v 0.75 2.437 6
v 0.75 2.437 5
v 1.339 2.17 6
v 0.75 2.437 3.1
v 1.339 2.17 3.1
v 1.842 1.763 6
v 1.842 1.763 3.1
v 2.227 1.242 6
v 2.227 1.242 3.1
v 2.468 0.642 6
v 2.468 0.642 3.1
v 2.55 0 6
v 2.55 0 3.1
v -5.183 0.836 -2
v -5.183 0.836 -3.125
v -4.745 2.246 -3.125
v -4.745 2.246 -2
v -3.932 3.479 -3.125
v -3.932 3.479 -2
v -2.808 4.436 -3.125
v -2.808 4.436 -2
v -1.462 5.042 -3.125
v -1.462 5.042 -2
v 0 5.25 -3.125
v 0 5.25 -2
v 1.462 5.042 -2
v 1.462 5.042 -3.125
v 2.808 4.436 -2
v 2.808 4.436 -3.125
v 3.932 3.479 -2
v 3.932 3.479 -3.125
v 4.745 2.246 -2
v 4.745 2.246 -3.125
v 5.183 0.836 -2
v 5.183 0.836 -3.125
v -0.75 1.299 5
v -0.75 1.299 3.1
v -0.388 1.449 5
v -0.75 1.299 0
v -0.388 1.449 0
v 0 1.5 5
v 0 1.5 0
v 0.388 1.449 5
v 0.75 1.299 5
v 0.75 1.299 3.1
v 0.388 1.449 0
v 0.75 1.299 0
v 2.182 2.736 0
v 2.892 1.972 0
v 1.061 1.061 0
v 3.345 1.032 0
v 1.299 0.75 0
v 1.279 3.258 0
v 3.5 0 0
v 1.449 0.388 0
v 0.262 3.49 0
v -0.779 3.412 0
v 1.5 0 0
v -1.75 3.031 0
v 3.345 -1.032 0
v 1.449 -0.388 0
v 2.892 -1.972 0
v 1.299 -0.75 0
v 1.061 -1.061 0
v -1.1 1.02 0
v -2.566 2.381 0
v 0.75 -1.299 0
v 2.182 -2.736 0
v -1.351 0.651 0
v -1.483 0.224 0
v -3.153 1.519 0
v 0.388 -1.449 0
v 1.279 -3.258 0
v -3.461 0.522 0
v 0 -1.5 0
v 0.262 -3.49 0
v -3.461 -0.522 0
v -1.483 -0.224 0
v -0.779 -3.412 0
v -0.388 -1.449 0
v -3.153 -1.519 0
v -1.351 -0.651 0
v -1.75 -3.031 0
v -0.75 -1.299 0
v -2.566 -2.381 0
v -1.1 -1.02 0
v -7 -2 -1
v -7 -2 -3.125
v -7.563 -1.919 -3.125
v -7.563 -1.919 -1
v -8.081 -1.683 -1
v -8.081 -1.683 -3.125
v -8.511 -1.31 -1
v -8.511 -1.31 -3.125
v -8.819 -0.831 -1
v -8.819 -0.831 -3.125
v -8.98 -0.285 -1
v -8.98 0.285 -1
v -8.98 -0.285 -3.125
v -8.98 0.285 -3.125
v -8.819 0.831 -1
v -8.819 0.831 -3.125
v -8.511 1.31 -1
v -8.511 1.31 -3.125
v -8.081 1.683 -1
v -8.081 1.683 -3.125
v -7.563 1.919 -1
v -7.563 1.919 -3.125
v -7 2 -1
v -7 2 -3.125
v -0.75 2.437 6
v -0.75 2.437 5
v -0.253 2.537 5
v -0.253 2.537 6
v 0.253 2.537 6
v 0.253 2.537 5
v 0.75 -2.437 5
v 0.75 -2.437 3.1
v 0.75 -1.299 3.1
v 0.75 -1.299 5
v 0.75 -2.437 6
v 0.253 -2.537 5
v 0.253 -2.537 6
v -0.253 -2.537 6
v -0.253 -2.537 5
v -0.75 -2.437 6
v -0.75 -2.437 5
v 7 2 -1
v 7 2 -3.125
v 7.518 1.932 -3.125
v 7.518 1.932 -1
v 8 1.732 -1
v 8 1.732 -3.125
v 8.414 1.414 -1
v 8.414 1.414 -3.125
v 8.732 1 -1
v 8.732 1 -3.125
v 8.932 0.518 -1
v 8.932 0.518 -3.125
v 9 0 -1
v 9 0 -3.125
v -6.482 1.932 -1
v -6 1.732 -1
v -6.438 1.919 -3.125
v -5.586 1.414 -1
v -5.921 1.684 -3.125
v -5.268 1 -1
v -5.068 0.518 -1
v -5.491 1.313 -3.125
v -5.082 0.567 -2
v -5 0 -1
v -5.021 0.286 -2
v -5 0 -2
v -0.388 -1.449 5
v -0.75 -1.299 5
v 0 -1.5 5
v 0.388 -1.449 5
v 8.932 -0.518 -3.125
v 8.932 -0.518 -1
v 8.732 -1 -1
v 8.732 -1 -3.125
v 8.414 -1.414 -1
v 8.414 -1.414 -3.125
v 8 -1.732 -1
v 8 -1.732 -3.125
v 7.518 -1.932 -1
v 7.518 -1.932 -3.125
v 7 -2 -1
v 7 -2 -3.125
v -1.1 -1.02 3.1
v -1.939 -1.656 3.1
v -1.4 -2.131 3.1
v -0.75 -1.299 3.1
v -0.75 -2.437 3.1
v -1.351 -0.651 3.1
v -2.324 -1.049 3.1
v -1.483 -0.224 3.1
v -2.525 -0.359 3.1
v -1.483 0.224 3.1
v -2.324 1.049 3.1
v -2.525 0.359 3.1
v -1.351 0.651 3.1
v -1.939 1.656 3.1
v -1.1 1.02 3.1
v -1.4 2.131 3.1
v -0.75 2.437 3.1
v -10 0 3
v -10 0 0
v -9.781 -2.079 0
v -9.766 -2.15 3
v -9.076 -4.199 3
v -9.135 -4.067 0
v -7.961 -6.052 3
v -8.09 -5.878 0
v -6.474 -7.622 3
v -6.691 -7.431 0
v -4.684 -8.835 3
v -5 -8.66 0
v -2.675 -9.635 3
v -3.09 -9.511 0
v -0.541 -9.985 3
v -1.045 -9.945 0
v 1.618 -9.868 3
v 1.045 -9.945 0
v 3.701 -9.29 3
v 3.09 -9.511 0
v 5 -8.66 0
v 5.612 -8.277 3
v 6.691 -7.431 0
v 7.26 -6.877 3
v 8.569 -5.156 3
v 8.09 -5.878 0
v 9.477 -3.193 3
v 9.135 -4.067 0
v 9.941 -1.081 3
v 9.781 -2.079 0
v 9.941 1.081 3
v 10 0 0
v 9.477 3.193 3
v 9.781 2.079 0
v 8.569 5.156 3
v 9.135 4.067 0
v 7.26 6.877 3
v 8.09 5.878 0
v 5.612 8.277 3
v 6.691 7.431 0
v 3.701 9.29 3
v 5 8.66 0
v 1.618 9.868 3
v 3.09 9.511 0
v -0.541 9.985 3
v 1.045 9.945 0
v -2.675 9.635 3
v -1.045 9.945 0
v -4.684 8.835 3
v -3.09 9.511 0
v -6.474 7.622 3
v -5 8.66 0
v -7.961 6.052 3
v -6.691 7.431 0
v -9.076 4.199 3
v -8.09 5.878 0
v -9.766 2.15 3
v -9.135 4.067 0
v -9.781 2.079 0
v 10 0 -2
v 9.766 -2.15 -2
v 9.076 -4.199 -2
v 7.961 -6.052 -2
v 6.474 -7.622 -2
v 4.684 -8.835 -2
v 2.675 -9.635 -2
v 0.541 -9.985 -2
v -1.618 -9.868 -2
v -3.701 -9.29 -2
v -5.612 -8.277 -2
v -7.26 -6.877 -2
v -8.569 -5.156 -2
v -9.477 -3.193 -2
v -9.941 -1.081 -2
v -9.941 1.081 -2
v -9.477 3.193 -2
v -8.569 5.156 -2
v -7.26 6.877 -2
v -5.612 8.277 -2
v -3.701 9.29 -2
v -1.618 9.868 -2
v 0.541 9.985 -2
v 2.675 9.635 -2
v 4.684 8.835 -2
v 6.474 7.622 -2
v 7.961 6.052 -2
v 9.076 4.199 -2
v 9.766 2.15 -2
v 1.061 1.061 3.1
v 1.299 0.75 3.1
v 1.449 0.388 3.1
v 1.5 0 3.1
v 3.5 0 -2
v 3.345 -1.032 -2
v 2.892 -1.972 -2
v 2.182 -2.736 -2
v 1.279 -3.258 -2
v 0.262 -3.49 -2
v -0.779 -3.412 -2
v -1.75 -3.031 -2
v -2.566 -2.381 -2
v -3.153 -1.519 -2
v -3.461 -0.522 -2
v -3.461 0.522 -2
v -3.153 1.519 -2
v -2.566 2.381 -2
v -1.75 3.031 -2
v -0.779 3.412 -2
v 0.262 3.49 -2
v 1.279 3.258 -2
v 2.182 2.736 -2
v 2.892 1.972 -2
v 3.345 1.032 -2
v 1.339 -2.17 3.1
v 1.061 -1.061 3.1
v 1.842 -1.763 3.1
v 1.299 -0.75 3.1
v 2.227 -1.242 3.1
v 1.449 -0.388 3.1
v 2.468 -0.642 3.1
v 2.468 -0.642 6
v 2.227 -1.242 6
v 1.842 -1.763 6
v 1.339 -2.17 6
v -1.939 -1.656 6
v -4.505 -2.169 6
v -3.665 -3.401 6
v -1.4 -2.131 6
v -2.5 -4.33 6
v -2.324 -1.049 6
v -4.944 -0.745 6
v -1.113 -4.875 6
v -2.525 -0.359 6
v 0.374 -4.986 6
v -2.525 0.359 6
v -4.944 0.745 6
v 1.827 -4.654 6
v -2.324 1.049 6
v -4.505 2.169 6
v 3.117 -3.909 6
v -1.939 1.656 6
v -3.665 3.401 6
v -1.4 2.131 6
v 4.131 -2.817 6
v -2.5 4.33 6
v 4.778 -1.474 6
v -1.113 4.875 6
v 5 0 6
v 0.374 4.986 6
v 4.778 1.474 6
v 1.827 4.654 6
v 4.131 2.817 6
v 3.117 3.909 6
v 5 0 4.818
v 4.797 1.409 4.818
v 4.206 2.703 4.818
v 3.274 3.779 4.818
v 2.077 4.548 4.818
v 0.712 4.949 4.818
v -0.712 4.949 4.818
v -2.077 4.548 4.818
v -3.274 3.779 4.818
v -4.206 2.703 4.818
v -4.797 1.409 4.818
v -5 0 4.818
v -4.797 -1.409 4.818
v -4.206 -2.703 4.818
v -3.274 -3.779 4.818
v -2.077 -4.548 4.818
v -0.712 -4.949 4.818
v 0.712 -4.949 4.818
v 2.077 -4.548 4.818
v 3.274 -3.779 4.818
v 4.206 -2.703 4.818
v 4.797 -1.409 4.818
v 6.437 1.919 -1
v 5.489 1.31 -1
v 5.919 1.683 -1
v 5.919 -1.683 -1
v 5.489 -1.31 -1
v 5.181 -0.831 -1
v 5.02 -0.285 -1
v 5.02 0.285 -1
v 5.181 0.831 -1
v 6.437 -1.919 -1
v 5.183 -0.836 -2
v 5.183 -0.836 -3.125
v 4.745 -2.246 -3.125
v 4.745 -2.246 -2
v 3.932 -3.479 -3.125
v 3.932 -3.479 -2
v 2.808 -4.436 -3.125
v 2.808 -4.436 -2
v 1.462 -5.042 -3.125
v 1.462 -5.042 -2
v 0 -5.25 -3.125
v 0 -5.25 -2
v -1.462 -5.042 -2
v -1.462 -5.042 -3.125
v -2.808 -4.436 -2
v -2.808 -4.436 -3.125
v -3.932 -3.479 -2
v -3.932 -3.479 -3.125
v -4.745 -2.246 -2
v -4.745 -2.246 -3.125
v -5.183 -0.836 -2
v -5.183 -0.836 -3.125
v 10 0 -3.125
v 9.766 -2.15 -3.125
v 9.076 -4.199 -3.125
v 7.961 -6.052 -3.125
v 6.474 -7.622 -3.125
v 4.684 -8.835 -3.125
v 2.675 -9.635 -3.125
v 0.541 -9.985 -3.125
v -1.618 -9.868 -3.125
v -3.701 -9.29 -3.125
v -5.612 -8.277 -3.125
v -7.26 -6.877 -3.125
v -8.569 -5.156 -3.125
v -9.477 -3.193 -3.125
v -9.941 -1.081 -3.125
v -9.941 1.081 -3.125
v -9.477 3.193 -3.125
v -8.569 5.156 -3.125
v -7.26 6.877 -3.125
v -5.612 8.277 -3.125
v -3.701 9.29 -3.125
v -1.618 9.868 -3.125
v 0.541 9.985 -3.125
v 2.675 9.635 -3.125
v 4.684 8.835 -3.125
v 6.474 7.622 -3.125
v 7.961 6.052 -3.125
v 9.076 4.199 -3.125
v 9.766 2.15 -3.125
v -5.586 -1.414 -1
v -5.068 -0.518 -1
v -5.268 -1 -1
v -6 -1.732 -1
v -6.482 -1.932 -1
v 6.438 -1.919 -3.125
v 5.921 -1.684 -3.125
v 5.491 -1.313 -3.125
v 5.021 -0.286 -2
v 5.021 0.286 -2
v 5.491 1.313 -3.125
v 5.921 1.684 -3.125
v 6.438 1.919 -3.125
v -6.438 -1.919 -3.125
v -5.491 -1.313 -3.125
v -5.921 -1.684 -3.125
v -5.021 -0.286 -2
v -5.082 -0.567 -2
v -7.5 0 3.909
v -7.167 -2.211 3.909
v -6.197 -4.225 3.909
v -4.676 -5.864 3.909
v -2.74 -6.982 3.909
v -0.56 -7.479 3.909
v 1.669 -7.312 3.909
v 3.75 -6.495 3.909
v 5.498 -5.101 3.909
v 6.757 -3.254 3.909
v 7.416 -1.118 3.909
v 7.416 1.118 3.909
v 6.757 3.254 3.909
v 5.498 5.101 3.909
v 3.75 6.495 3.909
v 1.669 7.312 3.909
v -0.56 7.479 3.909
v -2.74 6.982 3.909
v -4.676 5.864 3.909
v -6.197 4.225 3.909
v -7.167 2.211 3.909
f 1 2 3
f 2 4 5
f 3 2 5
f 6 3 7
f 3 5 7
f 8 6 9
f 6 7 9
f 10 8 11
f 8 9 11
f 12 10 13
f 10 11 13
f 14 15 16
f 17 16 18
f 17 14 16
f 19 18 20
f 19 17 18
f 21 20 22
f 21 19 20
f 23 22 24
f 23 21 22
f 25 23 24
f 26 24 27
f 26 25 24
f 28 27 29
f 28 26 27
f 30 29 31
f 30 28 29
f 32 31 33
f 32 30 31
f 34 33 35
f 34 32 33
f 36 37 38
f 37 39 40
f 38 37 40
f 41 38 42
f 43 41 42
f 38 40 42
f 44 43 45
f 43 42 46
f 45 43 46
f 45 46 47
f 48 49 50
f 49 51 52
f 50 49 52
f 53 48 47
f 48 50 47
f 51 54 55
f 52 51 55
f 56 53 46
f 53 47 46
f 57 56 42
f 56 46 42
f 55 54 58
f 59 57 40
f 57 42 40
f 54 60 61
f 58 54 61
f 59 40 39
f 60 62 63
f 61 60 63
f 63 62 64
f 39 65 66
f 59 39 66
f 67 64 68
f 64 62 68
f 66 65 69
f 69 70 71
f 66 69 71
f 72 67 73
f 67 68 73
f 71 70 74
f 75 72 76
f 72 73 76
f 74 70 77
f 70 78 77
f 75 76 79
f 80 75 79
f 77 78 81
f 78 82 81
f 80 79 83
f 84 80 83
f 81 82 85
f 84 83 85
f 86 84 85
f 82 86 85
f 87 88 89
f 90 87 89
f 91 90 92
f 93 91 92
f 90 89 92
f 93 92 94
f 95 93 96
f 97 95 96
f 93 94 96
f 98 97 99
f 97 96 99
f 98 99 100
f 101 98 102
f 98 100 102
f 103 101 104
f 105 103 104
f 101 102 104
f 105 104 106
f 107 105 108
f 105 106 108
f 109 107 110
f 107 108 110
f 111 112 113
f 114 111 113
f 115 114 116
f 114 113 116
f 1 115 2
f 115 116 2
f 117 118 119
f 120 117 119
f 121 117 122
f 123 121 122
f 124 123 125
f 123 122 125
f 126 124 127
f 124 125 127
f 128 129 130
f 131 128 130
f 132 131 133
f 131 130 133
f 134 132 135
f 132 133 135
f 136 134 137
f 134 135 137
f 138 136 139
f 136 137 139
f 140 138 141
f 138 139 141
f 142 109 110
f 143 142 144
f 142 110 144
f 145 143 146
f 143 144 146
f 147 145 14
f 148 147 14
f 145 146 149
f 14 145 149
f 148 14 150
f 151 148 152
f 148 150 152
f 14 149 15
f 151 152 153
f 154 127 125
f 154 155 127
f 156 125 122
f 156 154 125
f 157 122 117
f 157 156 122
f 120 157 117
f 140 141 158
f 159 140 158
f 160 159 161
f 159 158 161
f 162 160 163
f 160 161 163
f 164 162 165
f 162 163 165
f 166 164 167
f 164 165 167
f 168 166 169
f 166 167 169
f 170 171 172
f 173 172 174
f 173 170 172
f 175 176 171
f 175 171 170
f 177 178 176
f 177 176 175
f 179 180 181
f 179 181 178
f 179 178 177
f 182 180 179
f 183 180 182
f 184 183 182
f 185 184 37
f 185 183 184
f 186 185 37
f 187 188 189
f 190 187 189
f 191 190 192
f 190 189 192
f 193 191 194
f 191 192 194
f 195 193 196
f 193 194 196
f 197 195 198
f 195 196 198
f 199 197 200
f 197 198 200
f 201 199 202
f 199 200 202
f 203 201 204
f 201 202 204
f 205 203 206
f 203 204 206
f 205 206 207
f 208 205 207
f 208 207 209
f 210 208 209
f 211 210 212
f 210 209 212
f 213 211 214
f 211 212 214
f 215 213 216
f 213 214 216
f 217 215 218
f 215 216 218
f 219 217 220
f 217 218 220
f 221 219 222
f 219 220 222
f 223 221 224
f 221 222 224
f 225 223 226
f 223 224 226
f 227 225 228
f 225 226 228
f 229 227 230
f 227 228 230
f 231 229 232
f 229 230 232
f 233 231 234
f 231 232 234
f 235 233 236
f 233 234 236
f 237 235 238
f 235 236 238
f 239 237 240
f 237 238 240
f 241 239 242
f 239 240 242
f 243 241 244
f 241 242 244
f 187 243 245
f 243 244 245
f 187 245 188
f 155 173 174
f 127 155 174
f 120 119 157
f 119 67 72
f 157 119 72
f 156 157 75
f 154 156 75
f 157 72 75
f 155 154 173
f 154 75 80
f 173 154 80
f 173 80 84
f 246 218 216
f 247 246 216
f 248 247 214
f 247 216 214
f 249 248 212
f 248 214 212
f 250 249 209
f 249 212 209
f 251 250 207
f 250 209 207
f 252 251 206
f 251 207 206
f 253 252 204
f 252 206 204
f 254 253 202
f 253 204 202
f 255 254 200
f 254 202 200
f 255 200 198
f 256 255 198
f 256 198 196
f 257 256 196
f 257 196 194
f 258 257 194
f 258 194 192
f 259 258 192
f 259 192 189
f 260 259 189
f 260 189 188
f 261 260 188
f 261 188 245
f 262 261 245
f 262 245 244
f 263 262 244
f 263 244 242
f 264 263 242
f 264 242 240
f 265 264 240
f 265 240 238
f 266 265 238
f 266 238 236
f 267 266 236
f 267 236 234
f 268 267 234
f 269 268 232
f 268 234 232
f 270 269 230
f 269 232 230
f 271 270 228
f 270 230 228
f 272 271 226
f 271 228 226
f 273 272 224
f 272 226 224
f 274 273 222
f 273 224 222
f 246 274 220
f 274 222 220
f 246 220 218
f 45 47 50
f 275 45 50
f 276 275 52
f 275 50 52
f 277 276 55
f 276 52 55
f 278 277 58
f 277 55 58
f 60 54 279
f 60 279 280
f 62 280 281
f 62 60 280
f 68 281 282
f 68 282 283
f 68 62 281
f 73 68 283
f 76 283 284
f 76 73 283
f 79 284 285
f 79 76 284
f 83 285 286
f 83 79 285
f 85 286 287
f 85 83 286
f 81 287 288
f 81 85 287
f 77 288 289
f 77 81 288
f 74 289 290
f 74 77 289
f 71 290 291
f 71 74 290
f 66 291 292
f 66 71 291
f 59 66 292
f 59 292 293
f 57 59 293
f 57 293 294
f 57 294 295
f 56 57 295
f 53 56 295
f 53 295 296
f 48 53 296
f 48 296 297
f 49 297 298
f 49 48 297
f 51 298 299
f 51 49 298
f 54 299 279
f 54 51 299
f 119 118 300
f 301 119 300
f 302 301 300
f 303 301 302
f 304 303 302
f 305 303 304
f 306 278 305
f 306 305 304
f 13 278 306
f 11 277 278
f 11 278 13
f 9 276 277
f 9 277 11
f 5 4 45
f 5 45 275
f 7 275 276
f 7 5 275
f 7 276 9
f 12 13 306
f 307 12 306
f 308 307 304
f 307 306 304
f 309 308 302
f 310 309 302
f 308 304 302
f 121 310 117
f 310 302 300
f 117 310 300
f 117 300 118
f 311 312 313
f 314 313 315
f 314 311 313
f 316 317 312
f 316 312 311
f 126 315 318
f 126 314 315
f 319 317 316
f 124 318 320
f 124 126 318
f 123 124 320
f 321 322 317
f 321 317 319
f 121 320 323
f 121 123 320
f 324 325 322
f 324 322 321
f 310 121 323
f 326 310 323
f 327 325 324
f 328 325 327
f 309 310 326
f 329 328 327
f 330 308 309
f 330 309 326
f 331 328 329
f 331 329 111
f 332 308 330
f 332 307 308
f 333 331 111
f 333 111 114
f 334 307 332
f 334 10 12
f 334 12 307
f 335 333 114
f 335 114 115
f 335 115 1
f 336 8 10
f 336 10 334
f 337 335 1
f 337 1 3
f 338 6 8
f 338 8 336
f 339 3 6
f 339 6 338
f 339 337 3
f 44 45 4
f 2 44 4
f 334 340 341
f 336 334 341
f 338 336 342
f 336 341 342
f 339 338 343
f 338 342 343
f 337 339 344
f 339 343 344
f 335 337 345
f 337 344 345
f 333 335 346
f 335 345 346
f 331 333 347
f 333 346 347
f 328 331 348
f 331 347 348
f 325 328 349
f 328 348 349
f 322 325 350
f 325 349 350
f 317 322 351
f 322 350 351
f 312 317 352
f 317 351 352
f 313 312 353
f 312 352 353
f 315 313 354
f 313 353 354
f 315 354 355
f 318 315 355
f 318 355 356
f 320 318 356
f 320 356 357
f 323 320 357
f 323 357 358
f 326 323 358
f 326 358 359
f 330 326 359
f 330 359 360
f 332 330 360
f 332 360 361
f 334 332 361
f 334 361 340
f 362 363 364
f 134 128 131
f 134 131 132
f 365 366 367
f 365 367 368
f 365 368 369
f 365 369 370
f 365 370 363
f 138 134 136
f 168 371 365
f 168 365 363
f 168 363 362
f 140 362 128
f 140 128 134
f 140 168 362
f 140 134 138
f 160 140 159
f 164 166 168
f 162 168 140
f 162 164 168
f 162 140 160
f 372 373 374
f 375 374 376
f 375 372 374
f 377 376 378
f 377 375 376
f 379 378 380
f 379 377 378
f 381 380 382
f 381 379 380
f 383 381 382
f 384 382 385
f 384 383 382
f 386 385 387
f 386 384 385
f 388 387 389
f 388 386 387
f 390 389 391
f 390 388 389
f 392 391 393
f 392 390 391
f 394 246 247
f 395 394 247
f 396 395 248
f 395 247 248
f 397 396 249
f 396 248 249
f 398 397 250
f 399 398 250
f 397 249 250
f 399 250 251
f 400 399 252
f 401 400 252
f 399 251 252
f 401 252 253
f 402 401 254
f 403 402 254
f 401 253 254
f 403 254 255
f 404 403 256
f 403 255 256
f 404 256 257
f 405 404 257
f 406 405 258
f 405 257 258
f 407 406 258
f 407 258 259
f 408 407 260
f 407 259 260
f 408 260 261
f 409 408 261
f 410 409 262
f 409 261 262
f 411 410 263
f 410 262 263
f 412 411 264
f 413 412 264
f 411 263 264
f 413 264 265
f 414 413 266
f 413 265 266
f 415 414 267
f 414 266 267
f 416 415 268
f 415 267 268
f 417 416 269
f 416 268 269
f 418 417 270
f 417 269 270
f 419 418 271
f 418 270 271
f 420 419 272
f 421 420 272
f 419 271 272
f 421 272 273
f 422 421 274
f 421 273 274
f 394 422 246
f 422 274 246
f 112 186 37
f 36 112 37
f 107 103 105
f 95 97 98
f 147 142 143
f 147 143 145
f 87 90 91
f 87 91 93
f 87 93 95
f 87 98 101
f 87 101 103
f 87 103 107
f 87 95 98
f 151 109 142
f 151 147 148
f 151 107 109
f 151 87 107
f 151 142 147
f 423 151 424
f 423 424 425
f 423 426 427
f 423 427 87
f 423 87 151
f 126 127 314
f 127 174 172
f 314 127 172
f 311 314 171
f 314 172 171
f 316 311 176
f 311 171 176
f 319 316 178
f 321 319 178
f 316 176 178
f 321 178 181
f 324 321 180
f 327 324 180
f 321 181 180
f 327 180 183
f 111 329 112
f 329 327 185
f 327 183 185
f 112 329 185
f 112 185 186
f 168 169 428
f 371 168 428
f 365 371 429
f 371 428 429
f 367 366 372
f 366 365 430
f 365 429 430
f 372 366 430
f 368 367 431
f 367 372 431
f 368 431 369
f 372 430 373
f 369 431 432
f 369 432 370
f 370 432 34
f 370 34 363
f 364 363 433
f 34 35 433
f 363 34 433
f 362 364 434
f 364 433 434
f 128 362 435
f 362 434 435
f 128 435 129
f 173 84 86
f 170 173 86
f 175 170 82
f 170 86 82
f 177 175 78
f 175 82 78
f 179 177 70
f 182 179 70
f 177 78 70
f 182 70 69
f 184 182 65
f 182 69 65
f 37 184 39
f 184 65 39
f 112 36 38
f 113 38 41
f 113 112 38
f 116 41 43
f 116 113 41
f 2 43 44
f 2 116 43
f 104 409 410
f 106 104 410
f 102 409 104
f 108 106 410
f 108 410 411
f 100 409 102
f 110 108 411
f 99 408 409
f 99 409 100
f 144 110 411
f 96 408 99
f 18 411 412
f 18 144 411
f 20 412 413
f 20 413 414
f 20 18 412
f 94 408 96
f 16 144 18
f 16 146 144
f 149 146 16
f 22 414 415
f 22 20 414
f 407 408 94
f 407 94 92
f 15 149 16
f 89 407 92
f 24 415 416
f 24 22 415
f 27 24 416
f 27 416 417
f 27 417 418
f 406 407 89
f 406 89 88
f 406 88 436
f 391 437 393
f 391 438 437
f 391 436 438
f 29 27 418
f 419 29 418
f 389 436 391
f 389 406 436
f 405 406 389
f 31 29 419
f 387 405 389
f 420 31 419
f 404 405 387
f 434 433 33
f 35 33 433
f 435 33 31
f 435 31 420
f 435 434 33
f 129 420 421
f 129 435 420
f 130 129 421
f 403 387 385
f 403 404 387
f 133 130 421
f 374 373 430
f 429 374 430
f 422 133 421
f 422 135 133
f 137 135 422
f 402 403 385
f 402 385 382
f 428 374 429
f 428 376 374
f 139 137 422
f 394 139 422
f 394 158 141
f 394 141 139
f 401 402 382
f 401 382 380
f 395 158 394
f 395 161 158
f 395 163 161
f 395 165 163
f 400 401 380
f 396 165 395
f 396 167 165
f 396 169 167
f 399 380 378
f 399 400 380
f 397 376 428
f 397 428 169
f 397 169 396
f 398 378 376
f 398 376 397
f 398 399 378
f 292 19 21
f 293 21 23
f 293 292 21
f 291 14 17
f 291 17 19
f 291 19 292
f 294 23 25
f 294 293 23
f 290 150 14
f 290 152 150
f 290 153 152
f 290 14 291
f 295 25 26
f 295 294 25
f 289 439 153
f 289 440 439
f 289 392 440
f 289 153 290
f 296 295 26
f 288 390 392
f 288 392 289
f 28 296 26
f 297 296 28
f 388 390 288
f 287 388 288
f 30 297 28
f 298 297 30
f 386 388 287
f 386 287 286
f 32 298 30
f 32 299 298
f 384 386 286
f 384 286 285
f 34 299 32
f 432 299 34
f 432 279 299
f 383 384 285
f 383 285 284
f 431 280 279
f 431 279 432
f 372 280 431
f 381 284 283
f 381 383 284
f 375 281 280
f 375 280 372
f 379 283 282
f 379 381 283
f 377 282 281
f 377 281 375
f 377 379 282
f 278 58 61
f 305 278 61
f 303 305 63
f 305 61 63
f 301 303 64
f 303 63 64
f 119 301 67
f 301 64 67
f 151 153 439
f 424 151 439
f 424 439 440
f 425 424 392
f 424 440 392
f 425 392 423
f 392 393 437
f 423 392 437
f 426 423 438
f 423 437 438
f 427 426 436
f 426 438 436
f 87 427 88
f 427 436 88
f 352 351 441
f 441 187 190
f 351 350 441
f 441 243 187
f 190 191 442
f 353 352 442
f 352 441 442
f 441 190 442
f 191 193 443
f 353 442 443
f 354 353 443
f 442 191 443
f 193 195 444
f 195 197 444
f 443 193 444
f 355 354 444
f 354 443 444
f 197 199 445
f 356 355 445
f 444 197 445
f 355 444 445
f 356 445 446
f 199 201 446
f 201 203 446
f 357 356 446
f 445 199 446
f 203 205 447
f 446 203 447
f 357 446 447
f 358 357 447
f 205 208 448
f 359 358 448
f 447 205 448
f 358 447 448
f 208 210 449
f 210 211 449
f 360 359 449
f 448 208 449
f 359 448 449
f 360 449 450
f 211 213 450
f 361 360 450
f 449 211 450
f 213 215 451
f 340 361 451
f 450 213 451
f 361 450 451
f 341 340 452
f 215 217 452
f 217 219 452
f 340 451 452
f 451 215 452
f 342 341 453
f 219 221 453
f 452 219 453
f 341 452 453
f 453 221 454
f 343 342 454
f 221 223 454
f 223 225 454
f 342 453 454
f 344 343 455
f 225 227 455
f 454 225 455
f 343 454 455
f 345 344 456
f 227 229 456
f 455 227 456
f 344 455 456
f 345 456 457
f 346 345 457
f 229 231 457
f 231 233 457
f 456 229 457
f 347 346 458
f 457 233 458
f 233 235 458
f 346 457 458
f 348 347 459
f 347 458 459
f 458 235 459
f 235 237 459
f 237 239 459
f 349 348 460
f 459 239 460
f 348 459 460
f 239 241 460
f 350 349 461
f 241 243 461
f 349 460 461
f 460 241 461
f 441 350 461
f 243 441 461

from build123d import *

# Parameters (mm, degrees)
F0_R      = 5
F1_DEPTH  = 6
F2_DEPTH  = 5
F3_DEPTH  = 3.1
F6_R      = 10
F6_R_2    = 3.5
F7_DEPTH  = 2
F8_R      = 10
F8_R_2    = 5.25
F9_DEPTH  = 1.125
F11_DEPTH = 2.125


with BuildPart() as f1:
    # F0 (on Top) → F1 (new body)
    with BuildSketch(Plane.XY):
        Circle(F0_R)
        with BuildLine():
            ThreePointArc((0.75, 2.4372115214), (2.0512191497, 1.5149257408), (2.55, 0))
            ThreePointArc((2.55, 0), (2.0512191497, -1.5149257408), (0.75, -2.4372115214))
            ThreePointArc((0.75, -2.4372115214), (0, -2.55), (-0.75, -2.4372115214))
            ThreePointArc((-0.75, -2.4372115214), (-2.55, 0), (-0.75, 2.4372115214))
            ThreePointArc((-0.75, 2.4372115214), (0, 2.55), (0.75, 2.4372115214))
        make_face(mode=Mode.SUBTRACT)
    extrude(amount=F1_DEPTH)

    # F0 (on Top) → F2 (join)
    with BuildSketch(Plane.XY):
        with BuildLine():
            Line((0.75, 1.2990381057), (0.75, 2.4372115214))
            ThreePointArc((0.75, 2.4372115214), (0, 2.55), (-0.75, 2.4372115214))
            Line((-0.75, 2.4372115214), (-0.75, 1.2990381057))
            ThreePointArc((-0.75, 1.2990381057), (0, 1.5), (0.75, 1.2990381057))
        make_face()
        with BuildLine():
            ThreePointArc((-0.75, -2.4372115214), (0, -2.55), (0.75, -2.4372115214))
            Line((0.75, -2.4372115214), (0.75, -1.2990381057))
            ThreePointArc((0.75, -1.2990381057), (0, -1.5), (-0.75, -1.2990381057))
            Line((-0.75, -1.2990381057), (-0.75, -2.4372115214))
        make_face()
    extrude(amount=F2_DEPTH)

    # F0 (on Top) → F3 (join)
    with BuildSketch(Plane.XY):
        with BuildLine():
            Line((-0.75, 1.2990381057), (-0.75, 2.4372115214))
            ThreePointArc((-0.75, 2.4372115214), (-2.55, 0), (-0.75, -2.4372115214))
            Line((-0.75, -2.4372115214), (-0.75, -1.2990381057))
            ThreePointArc((-0.75, -1.2990381057), (-1.5, 0), (-0.75, 1.2990381057))
        make_face()
        with BuildLine():
            ThreePointArc((0.75, -2.4372115214), (2.0512191497, -1.5149257408), (2.55, 0))
            ThreePointArc((2.55, 0), (2.0512191497, 1.5149257408), (0.75, 2.4372115214))
            Line((0.75, 2.4372115214), (0.75, 1.2990381057))
            ThreePointArc((0.75, 1.2990381057), (1.2990381057, 0.75), (1.5, 0))
            ThreePointArc((1.5, 0), (1.2990381057, -0.75), (0.75, -1.2990381057))
            Line((0.75, -1.2990381057), (0.75, -2.4372115214))
        make_face()
    extrude(amount=F3_DEPTH)

    # F4 (on Front) → F5 (revolve)
    with BuildSketch(Plane.XZ):
        Polygon((-10, 0), (-4, 0), (-4, 5), (-4.5, 5), (-10, 3), align=None)
    revolve(axis=Axis((0, 0, 1.2425027974), (0, 0, 1)))

    # F6 (on face) → F7 (join)
    with BuildSketch(Plane(origin=(0, 0, 0), x_dir=(1, 0, 0), z_dir=(0, 0, -1))):
        Circle(F6_R)
        Circle(F6_R_2, mode=Mode.SUBTRACT)
    extrude(amount=F7_DEPTH)

    # F8 (on face) → F9 (join)
    with BuildSketch(Plane(origin=(0, 0, -2), x_dir=(1, 0, 0), z_dir=(0, 0, -1))):
        Circle(F8_R)
        Circle(F8_R_2, mode=Mode.SUBTRACT)
    extrude(amount=F9_DEPTH)

    # F10 (on face) → F11 (cut)
    with BuildSketch(Plane(origin=(0, 0, -3.125), x_dir=(1, 0, 0), z_dir=(0, 0, -1))):
        with BuildLine():
            ThreePointArc((-7, -2), (-5.5857864376, -1.4142135624), (-5, 0))
            ThreePointArc((-5, 0), (-5.5857864376, 1.4142135624), (-7, 2))
            ThreePointArc((-7, 2), (-9, 0), (-7, -2))
        make_face()
        with BuildLine():
            ThreePointArc((7, -2), (8.4142135624, -1.4142135624), (9, 0))
            ThreePointArc((9, 0), (8.4142135624, 1.4142135624), (7, 2))
            ThreePointArc((7, 2), (5, 0), (7, -2))
        make_face()
    extrude(amount=-F11_DEPTH, mode=Mode.SUBTRACT)


solid = f1.part
